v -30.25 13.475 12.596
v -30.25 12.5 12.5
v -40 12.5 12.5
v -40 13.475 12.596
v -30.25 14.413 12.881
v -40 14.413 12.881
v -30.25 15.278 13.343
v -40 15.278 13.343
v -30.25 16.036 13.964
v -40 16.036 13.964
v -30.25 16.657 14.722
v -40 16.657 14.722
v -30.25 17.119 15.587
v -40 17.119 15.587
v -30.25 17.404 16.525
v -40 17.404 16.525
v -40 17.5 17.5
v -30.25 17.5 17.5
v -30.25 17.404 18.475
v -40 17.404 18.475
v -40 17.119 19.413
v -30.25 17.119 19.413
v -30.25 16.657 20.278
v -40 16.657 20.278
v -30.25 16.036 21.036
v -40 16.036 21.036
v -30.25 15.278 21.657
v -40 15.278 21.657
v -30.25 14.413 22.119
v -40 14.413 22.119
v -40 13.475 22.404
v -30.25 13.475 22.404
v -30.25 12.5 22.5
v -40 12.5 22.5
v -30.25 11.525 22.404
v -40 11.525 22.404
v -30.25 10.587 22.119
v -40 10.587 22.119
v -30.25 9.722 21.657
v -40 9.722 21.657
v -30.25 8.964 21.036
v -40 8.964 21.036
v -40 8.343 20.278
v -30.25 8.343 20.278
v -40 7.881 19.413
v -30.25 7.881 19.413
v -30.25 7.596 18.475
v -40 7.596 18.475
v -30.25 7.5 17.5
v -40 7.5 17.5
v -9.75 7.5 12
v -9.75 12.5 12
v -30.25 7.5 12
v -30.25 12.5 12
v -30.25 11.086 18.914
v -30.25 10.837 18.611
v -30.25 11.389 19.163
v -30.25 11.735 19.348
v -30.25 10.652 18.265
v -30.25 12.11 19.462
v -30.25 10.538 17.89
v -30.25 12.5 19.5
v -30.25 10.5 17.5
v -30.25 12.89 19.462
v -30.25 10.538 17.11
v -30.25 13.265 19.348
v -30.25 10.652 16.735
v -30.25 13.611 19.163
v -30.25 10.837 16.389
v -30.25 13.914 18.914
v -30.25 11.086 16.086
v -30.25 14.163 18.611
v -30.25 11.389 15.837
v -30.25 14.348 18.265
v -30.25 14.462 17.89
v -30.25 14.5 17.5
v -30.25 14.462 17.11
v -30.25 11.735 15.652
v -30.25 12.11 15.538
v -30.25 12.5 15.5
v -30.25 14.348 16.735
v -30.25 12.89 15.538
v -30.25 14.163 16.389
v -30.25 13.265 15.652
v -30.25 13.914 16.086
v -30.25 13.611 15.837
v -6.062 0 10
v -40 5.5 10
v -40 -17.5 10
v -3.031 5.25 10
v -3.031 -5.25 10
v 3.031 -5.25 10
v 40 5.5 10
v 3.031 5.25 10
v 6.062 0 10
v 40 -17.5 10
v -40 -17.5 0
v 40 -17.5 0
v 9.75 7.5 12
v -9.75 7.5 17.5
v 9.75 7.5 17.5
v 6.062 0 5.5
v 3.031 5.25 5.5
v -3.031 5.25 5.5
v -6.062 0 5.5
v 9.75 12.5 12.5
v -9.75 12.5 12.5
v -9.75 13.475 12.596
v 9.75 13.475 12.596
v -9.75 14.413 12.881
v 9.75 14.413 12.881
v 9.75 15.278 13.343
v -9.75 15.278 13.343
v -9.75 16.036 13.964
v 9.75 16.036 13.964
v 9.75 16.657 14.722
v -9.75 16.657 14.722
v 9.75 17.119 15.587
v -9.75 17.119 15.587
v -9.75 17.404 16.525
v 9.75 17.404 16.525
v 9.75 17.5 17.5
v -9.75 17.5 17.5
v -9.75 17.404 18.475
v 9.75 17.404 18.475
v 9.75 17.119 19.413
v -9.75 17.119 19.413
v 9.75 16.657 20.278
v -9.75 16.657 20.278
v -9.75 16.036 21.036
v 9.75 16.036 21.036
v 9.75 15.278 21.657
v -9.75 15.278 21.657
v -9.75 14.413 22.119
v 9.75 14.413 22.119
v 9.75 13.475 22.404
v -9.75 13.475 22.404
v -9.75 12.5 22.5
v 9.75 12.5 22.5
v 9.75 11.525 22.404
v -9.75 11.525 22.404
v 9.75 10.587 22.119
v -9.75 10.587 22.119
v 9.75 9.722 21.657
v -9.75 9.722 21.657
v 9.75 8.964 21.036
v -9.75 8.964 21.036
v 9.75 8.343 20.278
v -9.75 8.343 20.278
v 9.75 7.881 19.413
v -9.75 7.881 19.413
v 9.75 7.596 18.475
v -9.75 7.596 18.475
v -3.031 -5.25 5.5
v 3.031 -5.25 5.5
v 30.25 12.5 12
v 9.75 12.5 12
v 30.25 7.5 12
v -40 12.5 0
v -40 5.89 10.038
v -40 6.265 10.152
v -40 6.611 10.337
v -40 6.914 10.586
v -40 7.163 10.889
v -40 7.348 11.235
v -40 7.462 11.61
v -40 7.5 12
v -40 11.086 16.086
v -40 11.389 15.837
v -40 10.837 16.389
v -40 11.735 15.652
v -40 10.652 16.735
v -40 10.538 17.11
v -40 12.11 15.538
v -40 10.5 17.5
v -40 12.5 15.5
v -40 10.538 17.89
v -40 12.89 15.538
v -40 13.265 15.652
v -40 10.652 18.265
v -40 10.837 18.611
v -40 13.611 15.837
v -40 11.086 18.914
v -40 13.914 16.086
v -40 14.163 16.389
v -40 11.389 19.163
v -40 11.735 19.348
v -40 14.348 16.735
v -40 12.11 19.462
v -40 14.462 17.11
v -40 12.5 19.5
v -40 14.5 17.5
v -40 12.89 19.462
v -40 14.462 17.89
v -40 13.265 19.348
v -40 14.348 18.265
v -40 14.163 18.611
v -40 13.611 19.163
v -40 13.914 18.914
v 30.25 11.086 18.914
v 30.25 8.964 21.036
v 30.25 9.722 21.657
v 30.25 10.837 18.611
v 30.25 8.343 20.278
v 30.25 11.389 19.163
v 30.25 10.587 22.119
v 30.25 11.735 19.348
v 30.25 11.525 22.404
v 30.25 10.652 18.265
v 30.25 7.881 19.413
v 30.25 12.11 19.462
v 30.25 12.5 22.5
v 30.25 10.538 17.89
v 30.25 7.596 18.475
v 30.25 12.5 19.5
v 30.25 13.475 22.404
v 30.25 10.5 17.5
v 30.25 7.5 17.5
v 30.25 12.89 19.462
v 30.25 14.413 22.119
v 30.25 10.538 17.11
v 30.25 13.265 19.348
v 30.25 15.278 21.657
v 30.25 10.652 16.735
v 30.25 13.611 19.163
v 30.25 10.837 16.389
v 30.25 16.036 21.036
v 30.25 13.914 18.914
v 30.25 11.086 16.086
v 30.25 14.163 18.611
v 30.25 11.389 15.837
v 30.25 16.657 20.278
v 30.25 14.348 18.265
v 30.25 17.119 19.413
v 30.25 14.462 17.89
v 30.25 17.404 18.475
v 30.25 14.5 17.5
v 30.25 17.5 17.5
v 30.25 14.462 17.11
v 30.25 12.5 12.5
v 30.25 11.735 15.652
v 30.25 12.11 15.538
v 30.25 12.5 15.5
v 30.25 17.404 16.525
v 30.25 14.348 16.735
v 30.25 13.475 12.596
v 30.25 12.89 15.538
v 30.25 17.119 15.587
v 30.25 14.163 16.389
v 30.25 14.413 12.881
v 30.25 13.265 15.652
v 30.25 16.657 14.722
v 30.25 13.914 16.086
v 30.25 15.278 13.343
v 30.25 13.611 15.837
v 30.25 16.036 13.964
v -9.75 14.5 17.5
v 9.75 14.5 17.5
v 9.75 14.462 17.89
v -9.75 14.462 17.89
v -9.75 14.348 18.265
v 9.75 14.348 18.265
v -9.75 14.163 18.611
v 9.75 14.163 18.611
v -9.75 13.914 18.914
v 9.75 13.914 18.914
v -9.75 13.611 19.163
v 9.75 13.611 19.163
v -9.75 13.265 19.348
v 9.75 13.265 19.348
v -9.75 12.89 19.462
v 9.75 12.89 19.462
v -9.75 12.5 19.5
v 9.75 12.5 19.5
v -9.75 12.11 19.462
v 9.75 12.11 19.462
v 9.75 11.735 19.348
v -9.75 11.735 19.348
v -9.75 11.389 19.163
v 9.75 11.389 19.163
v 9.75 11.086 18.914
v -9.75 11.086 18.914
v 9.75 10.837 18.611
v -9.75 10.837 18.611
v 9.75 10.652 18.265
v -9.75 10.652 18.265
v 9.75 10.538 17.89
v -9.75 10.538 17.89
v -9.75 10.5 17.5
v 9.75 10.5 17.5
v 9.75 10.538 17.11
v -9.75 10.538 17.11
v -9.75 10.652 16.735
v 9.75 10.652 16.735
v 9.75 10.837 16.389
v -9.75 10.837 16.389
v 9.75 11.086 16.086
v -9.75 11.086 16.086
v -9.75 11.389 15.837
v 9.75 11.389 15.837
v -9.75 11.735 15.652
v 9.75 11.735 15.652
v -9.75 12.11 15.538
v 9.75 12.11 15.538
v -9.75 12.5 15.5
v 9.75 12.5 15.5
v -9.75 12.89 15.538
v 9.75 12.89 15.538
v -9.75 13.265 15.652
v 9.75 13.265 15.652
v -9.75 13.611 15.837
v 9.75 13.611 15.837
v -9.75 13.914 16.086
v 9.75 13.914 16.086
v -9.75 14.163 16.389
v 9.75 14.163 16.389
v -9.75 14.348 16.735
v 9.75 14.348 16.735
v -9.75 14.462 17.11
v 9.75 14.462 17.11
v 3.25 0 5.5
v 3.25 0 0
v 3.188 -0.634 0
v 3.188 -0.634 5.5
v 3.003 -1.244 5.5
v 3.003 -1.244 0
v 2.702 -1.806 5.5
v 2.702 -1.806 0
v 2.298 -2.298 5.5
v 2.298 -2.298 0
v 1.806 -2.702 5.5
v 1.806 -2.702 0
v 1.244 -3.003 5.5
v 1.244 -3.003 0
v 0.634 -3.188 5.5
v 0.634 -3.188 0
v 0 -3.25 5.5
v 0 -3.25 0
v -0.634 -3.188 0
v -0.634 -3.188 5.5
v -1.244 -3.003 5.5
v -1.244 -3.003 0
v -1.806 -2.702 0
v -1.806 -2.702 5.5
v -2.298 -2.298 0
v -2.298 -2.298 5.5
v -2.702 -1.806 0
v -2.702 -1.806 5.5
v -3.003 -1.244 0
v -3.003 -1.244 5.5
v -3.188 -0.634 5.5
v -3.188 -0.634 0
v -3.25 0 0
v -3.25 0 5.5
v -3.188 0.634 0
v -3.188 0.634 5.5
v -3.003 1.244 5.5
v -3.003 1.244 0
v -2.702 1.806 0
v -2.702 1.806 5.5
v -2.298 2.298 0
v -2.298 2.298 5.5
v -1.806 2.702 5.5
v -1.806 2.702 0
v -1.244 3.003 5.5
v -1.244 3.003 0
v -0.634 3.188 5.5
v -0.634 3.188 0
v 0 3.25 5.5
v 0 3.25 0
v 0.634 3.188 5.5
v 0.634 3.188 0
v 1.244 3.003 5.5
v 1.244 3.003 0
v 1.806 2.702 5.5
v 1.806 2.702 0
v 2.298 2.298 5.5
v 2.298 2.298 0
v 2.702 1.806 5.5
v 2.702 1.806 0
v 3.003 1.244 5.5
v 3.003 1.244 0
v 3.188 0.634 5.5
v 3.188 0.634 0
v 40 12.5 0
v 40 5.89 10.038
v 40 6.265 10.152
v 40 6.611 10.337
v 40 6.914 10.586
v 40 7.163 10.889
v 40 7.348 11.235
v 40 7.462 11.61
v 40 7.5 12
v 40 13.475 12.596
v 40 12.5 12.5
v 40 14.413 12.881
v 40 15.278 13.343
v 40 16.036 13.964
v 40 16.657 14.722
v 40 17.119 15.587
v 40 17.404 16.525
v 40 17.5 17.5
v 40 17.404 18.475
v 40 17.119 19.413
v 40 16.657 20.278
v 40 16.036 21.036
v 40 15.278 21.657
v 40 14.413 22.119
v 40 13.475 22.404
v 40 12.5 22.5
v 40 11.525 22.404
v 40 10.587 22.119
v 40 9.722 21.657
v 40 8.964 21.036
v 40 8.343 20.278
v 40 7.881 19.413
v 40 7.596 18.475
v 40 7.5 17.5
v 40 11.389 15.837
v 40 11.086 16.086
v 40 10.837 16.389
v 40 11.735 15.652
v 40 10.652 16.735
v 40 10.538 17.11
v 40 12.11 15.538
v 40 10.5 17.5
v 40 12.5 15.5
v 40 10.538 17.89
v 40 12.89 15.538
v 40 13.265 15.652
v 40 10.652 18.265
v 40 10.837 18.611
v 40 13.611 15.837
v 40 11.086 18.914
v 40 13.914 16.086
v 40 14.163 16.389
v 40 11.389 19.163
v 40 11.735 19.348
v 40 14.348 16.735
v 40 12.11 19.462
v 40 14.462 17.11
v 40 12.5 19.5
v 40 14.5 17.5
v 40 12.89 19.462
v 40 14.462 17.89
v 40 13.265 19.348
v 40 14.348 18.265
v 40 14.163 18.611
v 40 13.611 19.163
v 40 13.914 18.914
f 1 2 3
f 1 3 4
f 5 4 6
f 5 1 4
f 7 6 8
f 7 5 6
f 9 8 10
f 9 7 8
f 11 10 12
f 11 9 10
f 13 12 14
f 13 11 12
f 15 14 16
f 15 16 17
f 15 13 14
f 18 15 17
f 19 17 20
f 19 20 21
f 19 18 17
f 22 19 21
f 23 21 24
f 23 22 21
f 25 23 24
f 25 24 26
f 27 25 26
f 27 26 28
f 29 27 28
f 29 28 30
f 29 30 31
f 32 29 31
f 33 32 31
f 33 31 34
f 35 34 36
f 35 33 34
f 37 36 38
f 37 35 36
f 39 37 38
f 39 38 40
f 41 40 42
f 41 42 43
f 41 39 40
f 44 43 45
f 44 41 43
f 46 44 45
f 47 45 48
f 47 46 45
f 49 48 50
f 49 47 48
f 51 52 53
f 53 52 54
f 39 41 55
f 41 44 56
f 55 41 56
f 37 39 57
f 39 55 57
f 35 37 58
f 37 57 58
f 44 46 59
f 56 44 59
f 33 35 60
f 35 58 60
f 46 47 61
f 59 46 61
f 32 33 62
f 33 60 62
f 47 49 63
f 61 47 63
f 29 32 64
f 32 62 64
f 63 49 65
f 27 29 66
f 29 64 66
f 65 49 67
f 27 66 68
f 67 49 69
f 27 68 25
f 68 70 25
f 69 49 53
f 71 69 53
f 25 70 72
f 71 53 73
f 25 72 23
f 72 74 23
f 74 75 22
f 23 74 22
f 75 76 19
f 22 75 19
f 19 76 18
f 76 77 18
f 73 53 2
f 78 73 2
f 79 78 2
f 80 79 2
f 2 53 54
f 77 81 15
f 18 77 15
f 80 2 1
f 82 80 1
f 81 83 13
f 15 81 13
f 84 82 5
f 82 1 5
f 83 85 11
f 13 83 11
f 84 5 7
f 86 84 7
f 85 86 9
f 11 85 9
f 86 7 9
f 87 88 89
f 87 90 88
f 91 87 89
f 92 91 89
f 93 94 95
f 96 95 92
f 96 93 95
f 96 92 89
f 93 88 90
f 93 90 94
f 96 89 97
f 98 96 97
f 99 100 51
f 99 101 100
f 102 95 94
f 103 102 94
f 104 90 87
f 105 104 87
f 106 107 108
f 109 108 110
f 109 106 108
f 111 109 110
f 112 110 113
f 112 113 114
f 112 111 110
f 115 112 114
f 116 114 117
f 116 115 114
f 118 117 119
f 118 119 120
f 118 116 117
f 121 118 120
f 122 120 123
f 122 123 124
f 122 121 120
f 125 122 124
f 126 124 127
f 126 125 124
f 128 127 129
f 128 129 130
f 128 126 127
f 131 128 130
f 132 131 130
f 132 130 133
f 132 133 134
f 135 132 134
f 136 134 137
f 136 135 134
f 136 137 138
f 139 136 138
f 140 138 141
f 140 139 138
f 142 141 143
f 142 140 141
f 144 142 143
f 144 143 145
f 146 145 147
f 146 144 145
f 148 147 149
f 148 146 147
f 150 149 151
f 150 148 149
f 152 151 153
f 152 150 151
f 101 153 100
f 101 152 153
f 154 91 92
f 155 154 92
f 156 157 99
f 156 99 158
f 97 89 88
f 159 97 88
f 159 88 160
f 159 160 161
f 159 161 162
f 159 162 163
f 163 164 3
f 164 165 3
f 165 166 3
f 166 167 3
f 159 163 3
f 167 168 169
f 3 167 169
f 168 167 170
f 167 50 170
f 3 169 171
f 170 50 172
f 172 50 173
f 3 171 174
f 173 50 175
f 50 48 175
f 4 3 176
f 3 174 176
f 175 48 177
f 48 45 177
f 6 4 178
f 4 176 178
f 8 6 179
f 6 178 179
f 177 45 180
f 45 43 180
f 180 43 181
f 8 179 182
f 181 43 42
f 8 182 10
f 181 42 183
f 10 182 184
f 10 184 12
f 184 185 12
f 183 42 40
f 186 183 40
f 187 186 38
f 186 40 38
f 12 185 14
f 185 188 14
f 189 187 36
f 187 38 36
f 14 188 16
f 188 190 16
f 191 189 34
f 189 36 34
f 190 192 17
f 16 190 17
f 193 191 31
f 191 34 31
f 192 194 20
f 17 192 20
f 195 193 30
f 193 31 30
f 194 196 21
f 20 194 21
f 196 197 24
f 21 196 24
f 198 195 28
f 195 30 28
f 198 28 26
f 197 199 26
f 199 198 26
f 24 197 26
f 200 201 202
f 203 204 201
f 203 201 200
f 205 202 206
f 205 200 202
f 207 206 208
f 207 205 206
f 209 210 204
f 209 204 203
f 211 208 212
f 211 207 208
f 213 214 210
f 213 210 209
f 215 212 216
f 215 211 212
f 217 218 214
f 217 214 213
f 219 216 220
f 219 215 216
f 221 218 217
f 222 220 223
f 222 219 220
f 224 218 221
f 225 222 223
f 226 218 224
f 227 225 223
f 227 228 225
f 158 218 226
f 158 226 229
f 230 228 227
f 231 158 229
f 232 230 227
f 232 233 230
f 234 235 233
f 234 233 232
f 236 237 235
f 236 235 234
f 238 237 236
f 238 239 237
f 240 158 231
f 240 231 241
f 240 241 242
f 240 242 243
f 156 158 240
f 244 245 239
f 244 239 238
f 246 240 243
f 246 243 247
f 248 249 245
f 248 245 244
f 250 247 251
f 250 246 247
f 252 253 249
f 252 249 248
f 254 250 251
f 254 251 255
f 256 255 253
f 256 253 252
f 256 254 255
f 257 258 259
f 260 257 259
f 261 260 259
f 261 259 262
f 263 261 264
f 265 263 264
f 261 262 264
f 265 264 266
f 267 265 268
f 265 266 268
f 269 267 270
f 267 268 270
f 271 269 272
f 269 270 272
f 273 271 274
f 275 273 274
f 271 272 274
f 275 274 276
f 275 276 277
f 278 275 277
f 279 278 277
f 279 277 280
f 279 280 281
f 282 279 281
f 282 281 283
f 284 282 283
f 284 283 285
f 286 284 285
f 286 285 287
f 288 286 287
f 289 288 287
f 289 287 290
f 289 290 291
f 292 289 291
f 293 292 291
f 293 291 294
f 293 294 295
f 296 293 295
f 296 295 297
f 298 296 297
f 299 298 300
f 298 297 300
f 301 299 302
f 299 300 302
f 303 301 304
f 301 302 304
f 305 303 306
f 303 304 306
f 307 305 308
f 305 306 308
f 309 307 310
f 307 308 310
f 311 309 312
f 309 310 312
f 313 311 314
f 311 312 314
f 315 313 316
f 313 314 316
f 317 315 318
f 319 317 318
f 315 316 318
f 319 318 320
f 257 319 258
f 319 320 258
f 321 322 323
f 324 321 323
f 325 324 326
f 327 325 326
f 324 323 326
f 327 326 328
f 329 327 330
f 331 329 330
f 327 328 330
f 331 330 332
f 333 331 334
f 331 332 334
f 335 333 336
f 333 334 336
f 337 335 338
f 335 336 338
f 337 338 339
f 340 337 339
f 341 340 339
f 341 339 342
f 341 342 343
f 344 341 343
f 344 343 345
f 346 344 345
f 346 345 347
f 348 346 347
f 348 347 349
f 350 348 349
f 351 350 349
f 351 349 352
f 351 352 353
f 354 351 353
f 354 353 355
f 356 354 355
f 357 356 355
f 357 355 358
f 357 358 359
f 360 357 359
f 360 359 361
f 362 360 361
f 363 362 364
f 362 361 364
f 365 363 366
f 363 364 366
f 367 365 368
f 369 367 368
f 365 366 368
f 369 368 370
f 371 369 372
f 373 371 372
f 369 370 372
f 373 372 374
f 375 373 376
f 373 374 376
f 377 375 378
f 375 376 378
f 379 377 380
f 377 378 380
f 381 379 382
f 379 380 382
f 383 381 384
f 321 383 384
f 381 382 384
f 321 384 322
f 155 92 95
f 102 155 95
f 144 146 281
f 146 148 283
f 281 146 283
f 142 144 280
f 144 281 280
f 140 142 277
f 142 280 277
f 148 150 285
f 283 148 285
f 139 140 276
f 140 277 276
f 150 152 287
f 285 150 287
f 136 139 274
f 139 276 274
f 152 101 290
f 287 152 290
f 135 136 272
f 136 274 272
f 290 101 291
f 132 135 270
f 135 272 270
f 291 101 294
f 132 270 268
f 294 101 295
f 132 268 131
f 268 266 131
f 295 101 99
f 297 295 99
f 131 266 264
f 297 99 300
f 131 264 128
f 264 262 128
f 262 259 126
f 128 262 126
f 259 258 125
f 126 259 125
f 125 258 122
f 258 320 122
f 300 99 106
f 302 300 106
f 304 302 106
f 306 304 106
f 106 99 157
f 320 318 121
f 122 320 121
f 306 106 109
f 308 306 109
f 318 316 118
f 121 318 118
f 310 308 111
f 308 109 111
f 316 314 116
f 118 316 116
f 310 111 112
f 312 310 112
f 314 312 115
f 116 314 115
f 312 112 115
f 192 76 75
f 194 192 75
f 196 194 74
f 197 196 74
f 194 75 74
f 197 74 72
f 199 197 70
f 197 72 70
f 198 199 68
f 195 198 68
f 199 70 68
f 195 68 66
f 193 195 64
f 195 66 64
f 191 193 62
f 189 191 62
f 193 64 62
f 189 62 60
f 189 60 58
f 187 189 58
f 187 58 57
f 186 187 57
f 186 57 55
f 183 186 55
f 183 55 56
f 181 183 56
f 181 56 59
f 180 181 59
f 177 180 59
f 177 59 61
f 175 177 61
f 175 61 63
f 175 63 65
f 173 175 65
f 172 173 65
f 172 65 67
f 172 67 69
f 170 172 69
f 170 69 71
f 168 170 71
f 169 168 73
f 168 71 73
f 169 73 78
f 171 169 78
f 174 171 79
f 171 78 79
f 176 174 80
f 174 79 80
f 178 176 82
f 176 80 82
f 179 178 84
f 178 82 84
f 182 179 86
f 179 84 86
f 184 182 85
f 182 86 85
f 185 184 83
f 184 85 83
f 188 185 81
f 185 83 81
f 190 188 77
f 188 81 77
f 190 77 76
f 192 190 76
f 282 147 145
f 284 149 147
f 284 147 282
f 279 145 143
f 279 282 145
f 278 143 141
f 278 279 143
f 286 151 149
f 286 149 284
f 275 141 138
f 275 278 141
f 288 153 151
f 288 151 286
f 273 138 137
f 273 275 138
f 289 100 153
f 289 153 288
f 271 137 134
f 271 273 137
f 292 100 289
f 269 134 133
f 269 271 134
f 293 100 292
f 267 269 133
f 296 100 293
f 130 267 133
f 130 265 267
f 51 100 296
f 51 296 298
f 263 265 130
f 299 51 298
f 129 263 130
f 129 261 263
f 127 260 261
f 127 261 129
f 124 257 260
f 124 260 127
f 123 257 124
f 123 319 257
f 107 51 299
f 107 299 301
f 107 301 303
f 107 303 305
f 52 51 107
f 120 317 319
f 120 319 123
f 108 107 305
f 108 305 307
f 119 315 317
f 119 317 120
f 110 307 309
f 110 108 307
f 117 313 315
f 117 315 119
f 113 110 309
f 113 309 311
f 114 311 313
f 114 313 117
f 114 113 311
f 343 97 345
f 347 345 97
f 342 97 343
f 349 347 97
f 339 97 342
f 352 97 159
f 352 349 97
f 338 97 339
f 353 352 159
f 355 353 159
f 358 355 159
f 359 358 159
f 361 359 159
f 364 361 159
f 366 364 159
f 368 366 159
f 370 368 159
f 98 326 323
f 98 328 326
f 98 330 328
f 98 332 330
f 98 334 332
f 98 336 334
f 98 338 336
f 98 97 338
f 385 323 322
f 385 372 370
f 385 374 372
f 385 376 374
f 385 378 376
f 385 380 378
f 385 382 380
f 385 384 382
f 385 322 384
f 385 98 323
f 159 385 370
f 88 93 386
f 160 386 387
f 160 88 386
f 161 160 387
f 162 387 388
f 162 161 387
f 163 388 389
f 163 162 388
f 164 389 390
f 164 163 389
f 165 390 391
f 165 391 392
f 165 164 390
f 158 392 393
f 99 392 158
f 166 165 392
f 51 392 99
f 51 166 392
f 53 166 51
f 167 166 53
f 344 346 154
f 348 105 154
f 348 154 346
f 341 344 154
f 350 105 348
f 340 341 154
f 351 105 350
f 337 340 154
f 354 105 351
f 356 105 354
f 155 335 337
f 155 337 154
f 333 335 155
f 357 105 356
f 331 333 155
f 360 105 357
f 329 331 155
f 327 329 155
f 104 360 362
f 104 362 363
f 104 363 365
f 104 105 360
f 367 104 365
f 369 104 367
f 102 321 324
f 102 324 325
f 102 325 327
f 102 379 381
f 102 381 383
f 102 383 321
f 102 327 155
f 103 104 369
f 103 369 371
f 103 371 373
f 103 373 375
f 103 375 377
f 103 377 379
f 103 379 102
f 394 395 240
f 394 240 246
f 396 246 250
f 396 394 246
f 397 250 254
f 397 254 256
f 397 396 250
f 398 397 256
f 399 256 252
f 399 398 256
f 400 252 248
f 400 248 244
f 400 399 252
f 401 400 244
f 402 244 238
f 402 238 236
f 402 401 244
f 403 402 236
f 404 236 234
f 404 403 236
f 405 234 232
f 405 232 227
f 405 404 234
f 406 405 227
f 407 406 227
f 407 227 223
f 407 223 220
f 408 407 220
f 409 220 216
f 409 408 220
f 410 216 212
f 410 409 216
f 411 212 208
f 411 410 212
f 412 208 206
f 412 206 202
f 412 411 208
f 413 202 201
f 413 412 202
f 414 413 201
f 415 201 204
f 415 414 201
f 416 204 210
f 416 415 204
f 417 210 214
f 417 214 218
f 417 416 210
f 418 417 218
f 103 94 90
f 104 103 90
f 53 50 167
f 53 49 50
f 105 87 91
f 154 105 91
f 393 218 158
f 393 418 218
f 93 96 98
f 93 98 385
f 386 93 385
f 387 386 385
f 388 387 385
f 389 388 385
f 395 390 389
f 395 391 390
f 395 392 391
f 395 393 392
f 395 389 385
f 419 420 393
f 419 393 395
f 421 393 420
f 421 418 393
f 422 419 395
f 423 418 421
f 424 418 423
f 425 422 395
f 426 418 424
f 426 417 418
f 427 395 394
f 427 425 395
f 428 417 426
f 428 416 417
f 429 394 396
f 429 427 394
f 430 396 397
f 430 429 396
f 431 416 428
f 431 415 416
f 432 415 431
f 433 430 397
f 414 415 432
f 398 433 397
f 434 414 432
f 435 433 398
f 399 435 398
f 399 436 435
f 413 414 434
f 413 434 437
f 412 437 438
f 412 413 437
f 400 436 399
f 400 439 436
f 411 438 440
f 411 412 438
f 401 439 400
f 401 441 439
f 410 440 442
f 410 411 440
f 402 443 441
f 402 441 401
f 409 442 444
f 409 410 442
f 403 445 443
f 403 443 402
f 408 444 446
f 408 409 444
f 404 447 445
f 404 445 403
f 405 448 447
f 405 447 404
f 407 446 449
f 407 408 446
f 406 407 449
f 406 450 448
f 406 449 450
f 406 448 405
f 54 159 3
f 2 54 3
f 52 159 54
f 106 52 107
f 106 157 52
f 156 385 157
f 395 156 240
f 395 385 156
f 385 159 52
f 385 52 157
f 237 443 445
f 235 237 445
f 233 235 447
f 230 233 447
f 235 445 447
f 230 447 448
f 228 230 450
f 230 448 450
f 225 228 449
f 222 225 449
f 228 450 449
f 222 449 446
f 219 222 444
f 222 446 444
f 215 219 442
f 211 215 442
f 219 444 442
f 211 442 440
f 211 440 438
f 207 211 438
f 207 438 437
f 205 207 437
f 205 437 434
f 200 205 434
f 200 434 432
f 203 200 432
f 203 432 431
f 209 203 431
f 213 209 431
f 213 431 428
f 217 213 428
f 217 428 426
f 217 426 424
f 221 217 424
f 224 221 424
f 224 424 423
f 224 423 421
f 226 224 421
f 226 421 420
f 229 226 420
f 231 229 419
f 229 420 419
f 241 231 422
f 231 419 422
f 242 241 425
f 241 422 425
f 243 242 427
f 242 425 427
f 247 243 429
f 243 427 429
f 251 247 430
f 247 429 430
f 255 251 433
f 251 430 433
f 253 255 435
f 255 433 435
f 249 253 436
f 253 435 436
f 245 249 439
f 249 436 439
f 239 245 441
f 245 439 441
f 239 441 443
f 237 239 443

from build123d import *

# Parameters (mm, degrees)
F1_DEPTH  = 40
F2_R      = 2
F3_DEPTH  = 80.001
F4_R      = 2
F6_W      = 20.5
F6_H      = 12
F7_DEPTH  = 10.501
F9_DEPTH  = 4.5
F10_R     = 3.25
F11_DEPTH = 22.501


# Not quite as in the source:
# - a pattern or mirror of a feature is missing from the dataset's text; its kind, count and spacing are read off the source's solid


with BuildPart() as f1:
    # F0 (on Right) → F1 (new body, symmetric)
    with BuildSketch(Plane.YZ):
        with BuildLine():
            Line((-17.5, 10), (-17.5, 0))
            Line((-17.5, 0), (12.5, 0))
            Line((12.5, 0), (12.5, 12.5))
            ThreePointArc((12.5, 12.5), (16.0355339059, 21.0355339059), (7.5, 17.5))
            Line((7.5, 17.5), (7.5, 10))
            Line((7.5, 10), (-17.5, 10))
        make_face()
    extrude(amount=F1_DEPTH, both=True)

    # F2 (on face) → F3 (cut, through all)
    with BuildSketch(Plane.YZ.offset(40)):
        with Locations((12.5, 17.5)):
            Circle(F2_R)
    extrude(amount=-F3_DEPTH, mode=Mode.SUBTRACT)

    # F4
    f4_edges = [f1.edges().sort_by_distance(p)[0] for p in [
        (0, 7.5, 10),
    ]]
    fillet(f4_edges, radius=F4_R)

    # F6 (on offset) → F7 (cut, through all)
    with BuildSketch(Plane.XY.offset(12)):
        with Locations((20, 13.5)):
            Rectangle(F6_W, F6_H)
    f7 = extrude(amount=F7_DEPTH, mode=Mode.SUBTRACT)

    # F7_copies: F7 across plane
    add(f7.mirror(Plane(origin=(0, 0, 0), x_dir=(0, 0, -1), z_dir=(-1, 0, 0))), mode=Mode.SUBTRACT)

    # F8 (on face) → F9 (cut)
    with BuildSketch(Plane.XY.offset(10)):
        Polygon((-3.0310889132, -5.25), (3.0310889132, -5.25), (6.0621778265, 0), (3.0310889132, 5.25), (-3.0310889132, 5.25), (-6.0621778265, 0), align=None)
    extrude(amount=-F9_DEPTH, mode=Mode.SUBTRACT)

    # F10 (on face) → F11 (cut, through all)
    with BuildSketch(Plane(origin=(0, 0, 0), x_dir=(1, 0, 0), z_dir=(0, 0, -1))):
        Circle(F10_R)
    extrude(amount=-F11_DEPTH, mode=Mode.SUBTRACT)


solid = f1.part
